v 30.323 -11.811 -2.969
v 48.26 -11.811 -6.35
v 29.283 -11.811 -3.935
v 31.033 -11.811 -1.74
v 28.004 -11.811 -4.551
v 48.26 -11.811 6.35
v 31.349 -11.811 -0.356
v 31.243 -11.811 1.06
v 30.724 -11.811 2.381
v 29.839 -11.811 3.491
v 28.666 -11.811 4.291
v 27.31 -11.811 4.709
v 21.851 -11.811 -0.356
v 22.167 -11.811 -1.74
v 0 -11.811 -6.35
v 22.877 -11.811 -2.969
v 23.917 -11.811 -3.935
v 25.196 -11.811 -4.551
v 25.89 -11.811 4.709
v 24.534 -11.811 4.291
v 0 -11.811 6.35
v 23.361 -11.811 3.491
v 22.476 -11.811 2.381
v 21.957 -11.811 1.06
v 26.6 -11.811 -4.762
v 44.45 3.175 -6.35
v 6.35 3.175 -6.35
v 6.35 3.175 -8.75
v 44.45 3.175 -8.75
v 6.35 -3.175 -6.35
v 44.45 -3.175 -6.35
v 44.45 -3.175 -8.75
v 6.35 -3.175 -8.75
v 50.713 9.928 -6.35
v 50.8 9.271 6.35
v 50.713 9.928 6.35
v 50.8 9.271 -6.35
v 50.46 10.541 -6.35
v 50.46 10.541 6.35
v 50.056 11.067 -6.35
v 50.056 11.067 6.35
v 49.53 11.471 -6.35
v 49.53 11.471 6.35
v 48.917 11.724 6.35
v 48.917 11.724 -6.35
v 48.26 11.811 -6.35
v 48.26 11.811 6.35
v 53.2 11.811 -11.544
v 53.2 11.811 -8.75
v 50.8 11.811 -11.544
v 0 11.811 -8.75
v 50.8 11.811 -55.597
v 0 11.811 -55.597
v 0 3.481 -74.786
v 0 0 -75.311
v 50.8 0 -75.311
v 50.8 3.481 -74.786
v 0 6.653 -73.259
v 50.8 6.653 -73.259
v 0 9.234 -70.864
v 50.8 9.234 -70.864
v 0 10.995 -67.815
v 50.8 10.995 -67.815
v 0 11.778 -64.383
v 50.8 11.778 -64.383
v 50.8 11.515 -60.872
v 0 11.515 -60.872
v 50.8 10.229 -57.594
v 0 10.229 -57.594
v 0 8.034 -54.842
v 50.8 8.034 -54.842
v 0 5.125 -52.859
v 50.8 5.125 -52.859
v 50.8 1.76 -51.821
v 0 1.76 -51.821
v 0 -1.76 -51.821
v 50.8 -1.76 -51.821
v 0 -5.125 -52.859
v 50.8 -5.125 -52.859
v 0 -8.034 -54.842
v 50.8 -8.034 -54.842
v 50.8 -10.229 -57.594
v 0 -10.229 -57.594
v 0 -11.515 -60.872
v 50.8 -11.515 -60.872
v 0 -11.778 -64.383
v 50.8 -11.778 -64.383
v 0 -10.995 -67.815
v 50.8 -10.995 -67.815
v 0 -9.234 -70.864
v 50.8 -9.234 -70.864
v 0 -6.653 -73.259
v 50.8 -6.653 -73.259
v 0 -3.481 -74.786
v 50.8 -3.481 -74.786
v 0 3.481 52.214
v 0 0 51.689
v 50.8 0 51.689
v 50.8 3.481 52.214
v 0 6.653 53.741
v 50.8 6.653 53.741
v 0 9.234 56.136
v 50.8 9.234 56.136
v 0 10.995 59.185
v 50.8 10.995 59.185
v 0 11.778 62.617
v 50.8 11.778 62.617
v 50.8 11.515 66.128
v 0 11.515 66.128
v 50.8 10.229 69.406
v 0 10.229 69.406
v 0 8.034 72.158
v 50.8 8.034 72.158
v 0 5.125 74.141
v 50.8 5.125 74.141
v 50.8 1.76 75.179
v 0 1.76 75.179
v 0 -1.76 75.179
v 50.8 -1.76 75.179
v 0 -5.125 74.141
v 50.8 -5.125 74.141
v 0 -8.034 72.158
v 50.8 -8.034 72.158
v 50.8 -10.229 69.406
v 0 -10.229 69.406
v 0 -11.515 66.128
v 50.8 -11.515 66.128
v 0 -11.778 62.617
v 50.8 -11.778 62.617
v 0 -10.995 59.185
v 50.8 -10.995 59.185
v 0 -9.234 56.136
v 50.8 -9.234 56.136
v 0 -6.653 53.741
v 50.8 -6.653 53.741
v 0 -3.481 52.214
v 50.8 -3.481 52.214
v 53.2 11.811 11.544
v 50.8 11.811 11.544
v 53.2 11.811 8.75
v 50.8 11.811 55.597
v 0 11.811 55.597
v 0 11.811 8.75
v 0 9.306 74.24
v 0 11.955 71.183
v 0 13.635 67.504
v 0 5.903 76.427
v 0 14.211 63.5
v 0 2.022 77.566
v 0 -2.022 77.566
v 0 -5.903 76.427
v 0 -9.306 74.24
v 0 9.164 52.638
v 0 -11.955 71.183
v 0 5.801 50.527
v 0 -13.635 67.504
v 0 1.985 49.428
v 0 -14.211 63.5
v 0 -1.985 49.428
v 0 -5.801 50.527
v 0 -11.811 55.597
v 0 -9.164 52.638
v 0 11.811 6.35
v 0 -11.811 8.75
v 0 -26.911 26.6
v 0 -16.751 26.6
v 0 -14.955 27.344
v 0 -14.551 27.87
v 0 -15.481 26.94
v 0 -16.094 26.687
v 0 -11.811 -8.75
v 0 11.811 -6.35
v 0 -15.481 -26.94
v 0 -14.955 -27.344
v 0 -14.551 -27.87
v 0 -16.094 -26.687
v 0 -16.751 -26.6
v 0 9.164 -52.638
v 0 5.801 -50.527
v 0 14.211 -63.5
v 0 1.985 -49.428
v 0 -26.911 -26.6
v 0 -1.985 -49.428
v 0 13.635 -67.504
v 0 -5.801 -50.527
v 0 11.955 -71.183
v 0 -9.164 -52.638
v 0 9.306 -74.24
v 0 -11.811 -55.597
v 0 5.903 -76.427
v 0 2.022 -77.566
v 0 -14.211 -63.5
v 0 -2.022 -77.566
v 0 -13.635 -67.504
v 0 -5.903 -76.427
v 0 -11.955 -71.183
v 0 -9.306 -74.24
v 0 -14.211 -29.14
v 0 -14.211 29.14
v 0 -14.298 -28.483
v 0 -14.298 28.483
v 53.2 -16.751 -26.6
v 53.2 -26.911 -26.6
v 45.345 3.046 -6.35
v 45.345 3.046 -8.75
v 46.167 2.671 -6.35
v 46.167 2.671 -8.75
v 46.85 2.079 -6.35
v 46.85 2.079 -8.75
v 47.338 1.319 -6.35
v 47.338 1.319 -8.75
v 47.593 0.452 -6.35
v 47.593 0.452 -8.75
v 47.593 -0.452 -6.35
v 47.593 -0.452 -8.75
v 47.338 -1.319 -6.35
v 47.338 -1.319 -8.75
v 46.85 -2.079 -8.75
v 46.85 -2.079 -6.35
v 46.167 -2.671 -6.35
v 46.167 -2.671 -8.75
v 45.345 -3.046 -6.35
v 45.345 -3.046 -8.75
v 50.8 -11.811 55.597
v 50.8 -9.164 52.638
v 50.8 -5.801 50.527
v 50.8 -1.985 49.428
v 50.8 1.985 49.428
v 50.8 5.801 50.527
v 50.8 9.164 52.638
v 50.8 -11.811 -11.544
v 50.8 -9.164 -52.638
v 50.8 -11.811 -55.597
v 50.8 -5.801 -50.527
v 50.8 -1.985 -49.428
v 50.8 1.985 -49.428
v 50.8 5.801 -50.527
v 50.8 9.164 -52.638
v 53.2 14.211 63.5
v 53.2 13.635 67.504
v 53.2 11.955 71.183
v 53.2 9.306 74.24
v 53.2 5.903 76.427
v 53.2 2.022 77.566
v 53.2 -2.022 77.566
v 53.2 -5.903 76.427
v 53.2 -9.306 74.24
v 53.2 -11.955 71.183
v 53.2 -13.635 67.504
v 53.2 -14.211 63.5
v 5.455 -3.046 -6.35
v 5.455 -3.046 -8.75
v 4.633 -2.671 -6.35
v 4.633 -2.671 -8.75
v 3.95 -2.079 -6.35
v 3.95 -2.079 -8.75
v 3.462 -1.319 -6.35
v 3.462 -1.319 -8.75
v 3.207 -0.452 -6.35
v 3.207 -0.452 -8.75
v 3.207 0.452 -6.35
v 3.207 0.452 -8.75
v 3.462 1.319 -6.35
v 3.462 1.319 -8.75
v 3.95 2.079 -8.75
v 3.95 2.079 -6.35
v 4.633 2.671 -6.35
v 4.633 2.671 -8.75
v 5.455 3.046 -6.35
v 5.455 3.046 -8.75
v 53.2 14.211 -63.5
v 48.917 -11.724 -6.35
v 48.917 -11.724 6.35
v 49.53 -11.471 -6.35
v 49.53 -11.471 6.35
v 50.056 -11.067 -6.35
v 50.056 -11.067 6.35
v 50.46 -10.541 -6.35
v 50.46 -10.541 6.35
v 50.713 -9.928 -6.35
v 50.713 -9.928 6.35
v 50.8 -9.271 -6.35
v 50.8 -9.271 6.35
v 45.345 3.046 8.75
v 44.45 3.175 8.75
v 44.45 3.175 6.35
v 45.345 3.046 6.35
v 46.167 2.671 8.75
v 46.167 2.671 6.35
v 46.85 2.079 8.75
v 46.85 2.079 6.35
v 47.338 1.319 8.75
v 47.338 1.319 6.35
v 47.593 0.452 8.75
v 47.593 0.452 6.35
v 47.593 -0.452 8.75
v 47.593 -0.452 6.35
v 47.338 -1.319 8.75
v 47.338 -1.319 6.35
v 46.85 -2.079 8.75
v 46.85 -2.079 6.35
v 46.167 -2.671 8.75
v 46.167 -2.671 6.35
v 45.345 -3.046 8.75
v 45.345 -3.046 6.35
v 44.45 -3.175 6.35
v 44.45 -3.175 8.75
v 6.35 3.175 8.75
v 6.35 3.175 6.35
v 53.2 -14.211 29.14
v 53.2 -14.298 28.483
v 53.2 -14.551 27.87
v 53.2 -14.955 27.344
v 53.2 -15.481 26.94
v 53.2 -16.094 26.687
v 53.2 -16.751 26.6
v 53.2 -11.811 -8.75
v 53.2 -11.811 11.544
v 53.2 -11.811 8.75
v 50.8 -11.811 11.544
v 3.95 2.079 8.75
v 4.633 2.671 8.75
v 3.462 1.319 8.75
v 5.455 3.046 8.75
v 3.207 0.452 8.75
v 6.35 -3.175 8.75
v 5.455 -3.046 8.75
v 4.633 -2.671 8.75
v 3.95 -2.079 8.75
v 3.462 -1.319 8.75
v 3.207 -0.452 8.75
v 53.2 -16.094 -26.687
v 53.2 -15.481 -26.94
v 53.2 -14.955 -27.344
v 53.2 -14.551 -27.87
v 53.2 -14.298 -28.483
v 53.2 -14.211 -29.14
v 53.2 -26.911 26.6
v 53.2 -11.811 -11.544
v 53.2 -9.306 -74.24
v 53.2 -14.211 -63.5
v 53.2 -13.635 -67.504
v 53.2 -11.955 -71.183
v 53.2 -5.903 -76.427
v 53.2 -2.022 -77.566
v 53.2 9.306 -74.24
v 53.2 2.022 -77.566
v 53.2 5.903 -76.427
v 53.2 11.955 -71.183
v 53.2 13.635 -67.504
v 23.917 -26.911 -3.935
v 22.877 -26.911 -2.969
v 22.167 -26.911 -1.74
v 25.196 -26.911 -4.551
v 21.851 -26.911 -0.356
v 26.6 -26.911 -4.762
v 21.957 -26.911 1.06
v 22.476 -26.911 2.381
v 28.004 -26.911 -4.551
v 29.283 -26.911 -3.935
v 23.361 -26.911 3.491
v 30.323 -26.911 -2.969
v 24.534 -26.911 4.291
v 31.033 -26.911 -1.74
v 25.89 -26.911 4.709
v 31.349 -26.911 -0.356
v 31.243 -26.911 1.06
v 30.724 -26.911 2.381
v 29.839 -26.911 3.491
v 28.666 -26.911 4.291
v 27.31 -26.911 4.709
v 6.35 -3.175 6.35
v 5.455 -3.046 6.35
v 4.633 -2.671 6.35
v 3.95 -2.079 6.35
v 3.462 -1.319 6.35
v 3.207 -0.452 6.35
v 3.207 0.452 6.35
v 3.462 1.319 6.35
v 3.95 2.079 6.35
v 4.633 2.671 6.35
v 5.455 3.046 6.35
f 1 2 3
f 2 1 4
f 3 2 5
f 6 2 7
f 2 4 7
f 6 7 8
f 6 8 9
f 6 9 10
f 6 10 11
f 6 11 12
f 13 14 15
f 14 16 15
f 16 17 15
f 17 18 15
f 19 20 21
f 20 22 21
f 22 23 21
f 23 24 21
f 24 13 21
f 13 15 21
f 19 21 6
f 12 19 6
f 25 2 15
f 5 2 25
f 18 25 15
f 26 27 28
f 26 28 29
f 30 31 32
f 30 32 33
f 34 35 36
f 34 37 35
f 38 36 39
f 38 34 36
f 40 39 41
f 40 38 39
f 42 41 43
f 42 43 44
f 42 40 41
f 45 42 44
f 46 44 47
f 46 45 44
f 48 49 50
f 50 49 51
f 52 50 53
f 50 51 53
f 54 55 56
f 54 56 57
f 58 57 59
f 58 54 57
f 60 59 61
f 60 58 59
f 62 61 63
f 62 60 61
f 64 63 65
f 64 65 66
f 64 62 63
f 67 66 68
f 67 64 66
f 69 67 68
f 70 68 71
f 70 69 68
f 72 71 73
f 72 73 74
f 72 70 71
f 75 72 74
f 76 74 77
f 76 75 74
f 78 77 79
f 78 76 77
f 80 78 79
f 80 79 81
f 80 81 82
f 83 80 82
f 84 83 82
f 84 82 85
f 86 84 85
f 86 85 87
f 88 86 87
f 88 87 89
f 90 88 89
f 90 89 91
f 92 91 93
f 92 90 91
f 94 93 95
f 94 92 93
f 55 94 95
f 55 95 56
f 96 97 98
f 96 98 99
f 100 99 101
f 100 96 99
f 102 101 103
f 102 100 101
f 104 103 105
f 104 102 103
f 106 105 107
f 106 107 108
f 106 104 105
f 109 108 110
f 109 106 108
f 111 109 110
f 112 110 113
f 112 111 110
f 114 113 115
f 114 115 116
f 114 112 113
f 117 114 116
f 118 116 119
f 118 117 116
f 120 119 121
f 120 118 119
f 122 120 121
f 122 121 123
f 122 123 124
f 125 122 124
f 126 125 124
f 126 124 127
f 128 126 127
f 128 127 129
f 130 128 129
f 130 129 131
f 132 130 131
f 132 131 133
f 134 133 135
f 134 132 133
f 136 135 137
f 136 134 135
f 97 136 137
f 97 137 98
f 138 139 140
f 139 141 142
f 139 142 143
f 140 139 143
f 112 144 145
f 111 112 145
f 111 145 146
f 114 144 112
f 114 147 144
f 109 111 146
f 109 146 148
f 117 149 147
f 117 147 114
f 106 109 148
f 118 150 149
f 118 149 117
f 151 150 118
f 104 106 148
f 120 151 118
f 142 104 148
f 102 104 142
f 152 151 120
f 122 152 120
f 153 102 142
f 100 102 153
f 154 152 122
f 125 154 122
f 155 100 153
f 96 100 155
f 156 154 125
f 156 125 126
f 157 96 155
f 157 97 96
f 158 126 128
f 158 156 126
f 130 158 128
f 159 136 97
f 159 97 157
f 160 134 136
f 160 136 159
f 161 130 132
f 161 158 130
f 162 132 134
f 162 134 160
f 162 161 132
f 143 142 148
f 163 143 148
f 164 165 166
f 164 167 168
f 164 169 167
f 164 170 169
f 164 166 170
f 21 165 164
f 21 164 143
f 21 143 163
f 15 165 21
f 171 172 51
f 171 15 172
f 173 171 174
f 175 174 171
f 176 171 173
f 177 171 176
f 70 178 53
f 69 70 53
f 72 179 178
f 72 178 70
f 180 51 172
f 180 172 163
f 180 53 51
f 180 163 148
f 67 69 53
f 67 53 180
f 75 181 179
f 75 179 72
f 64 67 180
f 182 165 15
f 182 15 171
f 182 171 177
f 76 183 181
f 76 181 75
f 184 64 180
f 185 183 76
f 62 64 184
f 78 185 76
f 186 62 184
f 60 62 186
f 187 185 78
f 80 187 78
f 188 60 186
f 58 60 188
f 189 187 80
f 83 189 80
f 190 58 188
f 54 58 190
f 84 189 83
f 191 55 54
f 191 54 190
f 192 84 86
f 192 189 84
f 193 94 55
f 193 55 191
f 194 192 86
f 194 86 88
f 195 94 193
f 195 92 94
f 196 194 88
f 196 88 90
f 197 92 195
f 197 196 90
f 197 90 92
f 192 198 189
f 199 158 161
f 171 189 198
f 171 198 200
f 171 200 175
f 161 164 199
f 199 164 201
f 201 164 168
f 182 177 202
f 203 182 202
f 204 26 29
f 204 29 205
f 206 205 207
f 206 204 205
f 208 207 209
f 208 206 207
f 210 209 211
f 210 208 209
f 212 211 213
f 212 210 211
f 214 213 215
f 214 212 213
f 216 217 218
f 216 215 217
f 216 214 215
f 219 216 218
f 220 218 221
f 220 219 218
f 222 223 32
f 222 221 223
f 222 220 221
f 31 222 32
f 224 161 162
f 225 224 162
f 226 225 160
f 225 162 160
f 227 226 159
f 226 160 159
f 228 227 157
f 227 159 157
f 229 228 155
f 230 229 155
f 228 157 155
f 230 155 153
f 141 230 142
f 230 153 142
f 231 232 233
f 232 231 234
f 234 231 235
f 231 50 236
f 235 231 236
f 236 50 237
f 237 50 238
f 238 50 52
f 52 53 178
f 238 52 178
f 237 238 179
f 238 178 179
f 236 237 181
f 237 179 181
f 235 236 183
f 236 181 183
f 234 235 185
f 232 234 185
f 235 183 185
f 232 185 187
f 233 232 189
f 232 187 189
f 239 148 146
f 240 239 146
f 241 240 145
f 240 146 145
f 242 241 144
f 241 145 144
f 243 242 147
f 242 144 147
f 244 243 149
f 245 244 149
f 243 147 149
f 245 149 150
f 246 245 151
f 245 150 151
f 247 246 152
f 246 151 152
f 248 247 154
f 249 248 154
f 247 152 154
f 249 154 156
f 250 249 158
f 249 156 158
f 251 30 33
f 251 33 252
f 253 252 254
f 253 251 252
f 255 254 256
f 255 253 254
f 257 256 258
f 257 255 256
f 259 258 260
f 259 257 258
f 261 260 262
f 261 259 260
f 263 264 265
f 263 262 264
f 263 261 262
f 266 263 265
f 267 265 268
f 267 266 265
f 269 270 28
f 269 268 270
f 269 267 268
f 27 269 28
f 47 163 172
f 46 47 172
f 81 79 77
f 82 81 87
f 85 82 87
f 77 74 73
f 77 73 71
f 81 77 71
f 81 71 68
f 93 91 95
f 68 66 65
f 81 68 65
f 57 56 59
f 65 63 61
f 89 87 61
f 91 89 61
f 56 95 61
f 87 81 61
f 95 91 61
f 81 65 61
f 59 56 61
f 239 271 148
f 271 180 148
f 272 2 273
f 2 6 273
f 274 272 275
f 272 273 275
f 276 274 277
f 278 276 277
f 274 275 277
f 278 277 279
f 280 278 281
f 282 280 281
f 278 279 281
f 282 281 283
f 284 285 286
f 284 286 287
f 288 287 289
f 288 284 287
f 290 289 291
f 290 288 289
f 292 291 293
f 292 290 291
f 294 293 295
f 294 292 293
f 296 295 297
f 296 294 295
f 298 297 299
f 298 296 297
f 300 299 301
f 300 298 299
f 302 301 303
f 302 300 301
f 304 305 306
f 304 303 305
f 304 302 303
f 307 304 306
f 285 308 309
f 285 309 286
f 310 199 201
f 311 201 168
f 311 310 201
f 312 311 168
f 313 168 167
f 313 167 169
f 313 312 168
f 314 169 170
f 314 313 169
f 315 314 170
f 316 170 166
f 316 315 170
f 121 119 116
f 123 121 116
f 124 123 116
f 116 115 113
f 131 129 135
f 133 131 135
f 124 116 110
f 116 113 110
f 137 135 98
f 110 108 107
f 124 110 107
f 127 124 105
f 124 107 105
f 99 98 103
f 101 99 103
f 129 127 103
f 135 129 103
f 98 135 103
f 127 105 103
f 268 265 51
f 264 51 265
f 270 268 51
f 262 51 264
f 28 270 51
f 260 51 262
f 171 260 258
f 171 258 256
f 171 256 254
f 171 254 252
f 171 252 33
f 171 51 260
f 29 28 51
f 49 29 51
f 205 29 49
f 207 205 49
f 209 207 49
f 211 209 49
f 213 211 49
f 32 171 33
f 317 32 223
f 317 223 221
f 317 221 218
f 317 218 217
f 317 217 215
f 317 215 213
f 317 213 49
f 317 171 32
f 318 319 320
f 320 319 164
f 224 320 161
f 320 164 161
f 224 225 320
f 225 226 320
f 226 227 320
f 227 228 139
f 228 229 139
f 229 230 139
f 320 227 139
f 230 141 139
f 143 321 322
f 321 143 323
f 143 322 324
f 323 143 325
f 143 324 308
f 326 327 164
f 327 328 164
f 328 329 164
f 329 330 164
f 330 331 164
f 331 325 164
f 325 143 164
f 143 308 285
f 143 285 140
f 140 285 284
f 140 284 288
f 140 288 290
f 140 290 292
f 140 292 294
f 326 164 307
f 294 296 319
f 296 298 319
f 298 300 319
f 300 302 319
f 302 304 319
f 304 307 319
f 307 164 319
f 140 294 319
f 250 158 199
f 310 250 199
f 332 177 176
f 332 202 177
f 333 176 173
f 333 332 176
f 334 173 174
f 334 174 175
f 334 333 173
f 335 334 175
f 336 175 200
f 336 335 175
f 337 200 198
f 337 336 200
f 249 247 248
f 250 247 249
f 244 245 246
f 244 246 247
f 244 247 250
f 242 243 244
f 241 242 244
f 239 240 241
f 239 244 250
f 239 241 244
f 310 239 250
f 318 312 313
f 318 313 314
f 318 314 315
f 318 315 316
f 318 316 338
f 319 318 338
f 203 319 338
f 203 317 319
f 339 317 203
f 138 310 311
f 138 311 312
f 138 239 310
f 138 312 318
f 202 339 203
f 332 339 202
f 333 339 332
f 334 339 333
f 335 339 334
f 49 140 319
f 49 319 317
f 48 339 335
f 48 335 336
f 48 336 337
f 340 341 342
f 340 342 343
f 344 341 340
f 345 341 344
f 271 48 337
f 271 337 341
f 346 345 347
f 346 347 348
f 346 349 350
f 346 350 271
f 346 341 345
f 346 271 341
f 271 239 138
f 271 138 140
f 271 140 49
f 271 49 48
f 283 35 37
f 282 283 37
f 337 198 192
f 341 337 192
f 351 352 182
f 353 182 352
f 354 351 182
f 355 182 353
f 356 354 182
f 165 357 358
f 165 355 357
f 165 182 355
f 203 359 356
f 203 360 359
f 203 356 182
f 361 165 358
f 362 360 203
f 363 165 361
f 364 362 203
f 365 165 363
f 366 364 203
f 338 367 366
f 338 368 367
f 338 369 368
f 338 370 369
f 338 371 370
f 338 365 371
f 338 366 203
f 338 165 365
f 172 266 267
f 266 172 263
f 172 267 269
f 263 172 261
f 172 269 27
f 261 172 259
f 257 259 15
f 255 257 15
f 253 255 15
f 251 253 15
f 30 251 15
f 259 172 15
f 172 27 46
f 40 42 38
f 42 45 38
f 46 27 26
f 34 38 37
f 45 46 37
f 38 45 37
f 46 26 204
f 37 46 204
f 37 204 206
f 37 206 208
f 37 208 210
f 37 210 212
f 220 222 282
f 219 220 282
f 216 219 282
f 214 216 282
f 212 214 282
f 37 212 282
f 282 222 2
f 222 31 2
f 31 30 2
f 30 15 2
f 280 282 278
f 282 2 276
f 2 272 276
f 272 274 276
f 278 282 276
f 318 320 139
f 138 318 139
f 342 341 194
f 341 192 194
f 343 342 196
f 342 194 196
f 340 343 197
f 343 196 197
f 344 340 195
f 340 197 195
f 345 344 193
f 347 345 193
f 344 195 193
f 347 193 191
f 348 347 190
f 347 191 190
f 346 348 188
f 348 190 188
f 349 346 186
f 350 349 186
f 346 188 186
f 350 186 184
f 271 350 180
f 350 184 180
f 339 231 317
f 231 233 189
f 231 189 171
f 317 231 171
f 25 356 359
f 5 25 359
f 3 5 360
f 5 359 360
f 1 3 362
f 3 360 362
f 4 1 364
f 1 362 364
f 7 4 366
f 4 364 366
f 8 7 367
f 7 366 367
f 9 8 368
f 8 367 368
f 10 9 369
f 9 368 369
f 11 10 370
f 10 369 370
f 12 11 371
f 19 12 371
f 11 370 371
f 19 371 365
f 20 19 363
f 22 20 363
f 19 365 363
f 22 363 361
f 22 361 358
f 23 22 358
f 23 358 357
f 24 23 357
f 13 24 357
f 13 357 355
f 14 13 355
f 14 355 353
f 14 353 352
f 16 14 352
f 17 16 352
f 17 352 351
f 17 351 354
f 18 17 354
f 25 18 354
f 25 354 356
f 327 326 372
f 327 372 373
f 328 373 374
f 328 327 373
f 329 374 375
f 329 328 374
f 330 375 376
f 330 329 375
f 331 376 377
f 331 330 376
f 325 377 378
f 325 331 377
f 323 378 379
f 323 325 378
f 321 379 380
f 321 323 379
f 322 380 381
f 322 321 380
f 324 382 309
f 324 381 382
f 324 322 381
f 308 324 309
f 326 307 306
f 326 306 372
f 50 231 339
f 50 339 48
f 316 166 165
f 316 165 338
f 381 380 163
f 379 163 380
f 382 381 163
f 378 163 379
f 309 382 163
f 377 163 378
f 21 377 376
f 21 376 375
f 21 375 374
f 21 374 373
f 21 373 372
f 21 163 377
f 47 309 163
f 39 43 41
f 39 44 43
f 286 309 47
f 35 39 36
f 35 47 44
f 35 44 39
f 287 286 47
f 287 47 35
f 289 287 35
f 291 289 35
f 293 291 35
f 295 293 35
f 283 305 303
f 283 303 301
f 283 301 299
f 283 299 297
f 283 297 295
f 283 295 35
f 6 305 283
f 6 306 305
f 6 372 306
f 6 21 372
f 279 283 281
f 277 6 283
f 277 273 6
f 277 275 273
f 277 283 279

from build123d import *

# Parameters (mm, degrees)
SKETCH1_R           = 11.811
BOSS_EXTRUDE1_DEPTH = 50.8
BOSS_EXTRUDE2_DEPTH = 2.399999772
SKETCH4_W           = 53.199999772
SKETCH4_H           = 53.199999772
BOSS_EXTRUDE4_DEPTH = 12.7
CUT_EXTRUDE2_REACH  = 104.763
SKETCH5_R           = 4.7625
SKETCH7_W           = 53.199999772
SKETCH7_H           = 2.399999772
BOSS_EXTRUDE5_DEPTH = 23.622
CUT_EXTRUDE3_REACH  = 107.024
SKETCH10_W          = 2.794
SKETCH10_H          = 23.622
CUT_EXTRUDE4_DEPTH  = 2.54
FILLET1_R           = 2.54


with BuildPart() as part:
    # Sketch1 → Boss-Extrude1 (new body)
    with BuildSketch(Plane(origin=(0, 0, 0), x_dir=(0, 0, -1), z_dir=(1, 0, 0))):
        with BuildLine():
            Line((-63.5, 14.210999772), (63.5, 14.210999772))
            ThreePointArc((63.5, 14.210999772), (77.710999772, 0), (63.5, -14.210999772))
            Line((63.5, -14.210999772), (-63.5, -14.210999772))
            ThreePointArc((-63.5, -14.210999772), (-77.710999772, 0), (-63.5, 14.210999772))
        make_face()
        with Locations((-63.5, 0)):
            Circle(SKETCH1_R, mode=Mode.SUBTRACT)
        with Locations((63.5, 0)):
            Circle(SKETCH1_R, mode=Mode.SUBTRACT)
        with BuildLine():
            Line((-55.597292014, 11.811), (55.597292014, 11.811))
            ThreePointArc((55.597292014, 11.811), (49.289000228, 0), (55.597292014, -11.811))
            Line((55.597292014, -11.811), (-55.597292014, -11.811))
            ThreePointArc((-55.597292014, -11.811), (-49.289000228, 0), (-55.597292014, 11.811))
        make_face(mode=Mode.SUBTRACT)
    extrude(amount=BOSS_EXTRUDE1_DEPTH)

    # Sketch2 → Boss-Extrude2 (add)
    with BuildSketch(Plane(origin=(50.8, 0, 0), x_dir=(0, 0, -1), z_dir=(1, 0, 0))):
        with BuildLine():
            Line((-63.5, -14.210999772), (63.5, -14.210999772))
            ThreePointArc((63.5, -14.210999772), (77.710999772, 0), (63.5, 14.210999772))
            Line((63.5, 14.210999772), (-63.5, 14.210999772))
            ThreePointArc((-63.5, 14.210999772), (-77.710999772, 0), (-63.5, -14.210999772))
        make_face()
    extrude(amount=BOSS_EXTRUDE2_DEPTH)

    # Sketch4 → Boss-Extrude4 (add)
    with BuildSketch(Plane.XZ.offset(14.210999772)):
        with Locations((26.599999886, 0)):
            Rectangle(SKETCH4_W, SKETCH4_H)
    extrude(amount=BOSS_EXTRUDE4_DEPTH)

    # Sketch5 → Cut-Extrude2 (cut, up to next)
    with BuildSketch(Plane.XZ.offset(26.910999772), mode=Mode.PRIVATE) as cut_extrude2_sk1:
        with Locations(Location((26.599999886, 0, 0), (0, 0, 270))):
            Circle(SKETCH5_R)
    cut_extrude2_tool1 = extrude(cut_extrude2_sk1.sketch, amount=-CUT_EXTRUDE2_REACH, mode=Mode.PRIVATE) & part.part
    add(cut_extrude2_tool1.solids().sort_by_distance((26.6, -26.911, 0))[0], mode=Mode.SUBTRACT)

    # Sketch7 → Boss-Extrude5 (add)
    with BuildSketch(Plane(origin=(0, -11.811, 0), x_dir=(1, 0, 0), z_dir=(0, 1, 0))):
        with Locations((26.599999886, 7.549999886)):
            Rectangle(SKETCH7_W, SKETCH7_H)
        with Locations((26.599999886, -7.549999886)):
            Rectangle(SKETCH7_W, SKETCH7_H)
    extrude(amount=BOSS_EXTRUDE5_DEPTH)

    # Cut-Extrude3: up to this face of the body (flat: up to its plane)
    cut_extrude3_end = Plane(part.part.faces().sort_by_distance((25.4, 0, -8.749999772))[0])
    # Sketch9 → Cut-Extrude3 (cut, up to the picked face)
    with BuildSketch(Plane.XY.offset(8.749999772), mode=Mode.PRIVATE) as cut_extrude3_sk1:
        with BuildLine():
            Line((6.35, 3.175), (44.45, 3.175))
            ThreePointArc((44.45, 3.175), (47.625, 0), (44.45, -3.175))
            Line((44.45, -3.175), (6.35, -3.175))
            ThreePointArc((6.35, -3.175), (3.175, 0), (6.35, 3.175))
        make_face()
    cut_extrude3_tool1 = split(extrude(cut_extrude3_sk1.sketch, amount=-CUT_EXTRUDE3_REACH, mode=Mode.PRIVATE), bisect_by=cut_extrude3_end, keep=Keep.BOTH, mode=Mode.PRIVATE)
    add(cut_extrude3_tool1.solids().sort_by(Axis((25.4, 0, 8.75), (0, 0, -1)))[0], mode=Mode.SUBTRACT)

    # Sketch10 → Cut-Extrude4 (cut)
    with BuildSketch(Plane.ZY.offset(-50.8)):
        with Locations((-10.146999772, 0)):
            Rectangle(SKETCH10_W, SKETCH10_H)
        with Locations((10.146999772, 0)):
            Rectangle(SKETCH10_W, SKETCH10_H)
    extrude(amount=-CUT_EXTRUDE4_DEPTH, mode=Mode.SUBTRACT)

    # Fillet1
    fillet1_edges = [part.edges().sort_by_distance(p)[0] for p in [
        (26.599999886, -14.210999772, 26.599999886),
        (26.599999886, -14.210999772, -26.599999886),
        (50.8, 11.811, 0),
        (50.8, -11.811, 0),
    ]]
    fillet(fillet1_edges, radius=FILLET1_R)


solid = part.part
